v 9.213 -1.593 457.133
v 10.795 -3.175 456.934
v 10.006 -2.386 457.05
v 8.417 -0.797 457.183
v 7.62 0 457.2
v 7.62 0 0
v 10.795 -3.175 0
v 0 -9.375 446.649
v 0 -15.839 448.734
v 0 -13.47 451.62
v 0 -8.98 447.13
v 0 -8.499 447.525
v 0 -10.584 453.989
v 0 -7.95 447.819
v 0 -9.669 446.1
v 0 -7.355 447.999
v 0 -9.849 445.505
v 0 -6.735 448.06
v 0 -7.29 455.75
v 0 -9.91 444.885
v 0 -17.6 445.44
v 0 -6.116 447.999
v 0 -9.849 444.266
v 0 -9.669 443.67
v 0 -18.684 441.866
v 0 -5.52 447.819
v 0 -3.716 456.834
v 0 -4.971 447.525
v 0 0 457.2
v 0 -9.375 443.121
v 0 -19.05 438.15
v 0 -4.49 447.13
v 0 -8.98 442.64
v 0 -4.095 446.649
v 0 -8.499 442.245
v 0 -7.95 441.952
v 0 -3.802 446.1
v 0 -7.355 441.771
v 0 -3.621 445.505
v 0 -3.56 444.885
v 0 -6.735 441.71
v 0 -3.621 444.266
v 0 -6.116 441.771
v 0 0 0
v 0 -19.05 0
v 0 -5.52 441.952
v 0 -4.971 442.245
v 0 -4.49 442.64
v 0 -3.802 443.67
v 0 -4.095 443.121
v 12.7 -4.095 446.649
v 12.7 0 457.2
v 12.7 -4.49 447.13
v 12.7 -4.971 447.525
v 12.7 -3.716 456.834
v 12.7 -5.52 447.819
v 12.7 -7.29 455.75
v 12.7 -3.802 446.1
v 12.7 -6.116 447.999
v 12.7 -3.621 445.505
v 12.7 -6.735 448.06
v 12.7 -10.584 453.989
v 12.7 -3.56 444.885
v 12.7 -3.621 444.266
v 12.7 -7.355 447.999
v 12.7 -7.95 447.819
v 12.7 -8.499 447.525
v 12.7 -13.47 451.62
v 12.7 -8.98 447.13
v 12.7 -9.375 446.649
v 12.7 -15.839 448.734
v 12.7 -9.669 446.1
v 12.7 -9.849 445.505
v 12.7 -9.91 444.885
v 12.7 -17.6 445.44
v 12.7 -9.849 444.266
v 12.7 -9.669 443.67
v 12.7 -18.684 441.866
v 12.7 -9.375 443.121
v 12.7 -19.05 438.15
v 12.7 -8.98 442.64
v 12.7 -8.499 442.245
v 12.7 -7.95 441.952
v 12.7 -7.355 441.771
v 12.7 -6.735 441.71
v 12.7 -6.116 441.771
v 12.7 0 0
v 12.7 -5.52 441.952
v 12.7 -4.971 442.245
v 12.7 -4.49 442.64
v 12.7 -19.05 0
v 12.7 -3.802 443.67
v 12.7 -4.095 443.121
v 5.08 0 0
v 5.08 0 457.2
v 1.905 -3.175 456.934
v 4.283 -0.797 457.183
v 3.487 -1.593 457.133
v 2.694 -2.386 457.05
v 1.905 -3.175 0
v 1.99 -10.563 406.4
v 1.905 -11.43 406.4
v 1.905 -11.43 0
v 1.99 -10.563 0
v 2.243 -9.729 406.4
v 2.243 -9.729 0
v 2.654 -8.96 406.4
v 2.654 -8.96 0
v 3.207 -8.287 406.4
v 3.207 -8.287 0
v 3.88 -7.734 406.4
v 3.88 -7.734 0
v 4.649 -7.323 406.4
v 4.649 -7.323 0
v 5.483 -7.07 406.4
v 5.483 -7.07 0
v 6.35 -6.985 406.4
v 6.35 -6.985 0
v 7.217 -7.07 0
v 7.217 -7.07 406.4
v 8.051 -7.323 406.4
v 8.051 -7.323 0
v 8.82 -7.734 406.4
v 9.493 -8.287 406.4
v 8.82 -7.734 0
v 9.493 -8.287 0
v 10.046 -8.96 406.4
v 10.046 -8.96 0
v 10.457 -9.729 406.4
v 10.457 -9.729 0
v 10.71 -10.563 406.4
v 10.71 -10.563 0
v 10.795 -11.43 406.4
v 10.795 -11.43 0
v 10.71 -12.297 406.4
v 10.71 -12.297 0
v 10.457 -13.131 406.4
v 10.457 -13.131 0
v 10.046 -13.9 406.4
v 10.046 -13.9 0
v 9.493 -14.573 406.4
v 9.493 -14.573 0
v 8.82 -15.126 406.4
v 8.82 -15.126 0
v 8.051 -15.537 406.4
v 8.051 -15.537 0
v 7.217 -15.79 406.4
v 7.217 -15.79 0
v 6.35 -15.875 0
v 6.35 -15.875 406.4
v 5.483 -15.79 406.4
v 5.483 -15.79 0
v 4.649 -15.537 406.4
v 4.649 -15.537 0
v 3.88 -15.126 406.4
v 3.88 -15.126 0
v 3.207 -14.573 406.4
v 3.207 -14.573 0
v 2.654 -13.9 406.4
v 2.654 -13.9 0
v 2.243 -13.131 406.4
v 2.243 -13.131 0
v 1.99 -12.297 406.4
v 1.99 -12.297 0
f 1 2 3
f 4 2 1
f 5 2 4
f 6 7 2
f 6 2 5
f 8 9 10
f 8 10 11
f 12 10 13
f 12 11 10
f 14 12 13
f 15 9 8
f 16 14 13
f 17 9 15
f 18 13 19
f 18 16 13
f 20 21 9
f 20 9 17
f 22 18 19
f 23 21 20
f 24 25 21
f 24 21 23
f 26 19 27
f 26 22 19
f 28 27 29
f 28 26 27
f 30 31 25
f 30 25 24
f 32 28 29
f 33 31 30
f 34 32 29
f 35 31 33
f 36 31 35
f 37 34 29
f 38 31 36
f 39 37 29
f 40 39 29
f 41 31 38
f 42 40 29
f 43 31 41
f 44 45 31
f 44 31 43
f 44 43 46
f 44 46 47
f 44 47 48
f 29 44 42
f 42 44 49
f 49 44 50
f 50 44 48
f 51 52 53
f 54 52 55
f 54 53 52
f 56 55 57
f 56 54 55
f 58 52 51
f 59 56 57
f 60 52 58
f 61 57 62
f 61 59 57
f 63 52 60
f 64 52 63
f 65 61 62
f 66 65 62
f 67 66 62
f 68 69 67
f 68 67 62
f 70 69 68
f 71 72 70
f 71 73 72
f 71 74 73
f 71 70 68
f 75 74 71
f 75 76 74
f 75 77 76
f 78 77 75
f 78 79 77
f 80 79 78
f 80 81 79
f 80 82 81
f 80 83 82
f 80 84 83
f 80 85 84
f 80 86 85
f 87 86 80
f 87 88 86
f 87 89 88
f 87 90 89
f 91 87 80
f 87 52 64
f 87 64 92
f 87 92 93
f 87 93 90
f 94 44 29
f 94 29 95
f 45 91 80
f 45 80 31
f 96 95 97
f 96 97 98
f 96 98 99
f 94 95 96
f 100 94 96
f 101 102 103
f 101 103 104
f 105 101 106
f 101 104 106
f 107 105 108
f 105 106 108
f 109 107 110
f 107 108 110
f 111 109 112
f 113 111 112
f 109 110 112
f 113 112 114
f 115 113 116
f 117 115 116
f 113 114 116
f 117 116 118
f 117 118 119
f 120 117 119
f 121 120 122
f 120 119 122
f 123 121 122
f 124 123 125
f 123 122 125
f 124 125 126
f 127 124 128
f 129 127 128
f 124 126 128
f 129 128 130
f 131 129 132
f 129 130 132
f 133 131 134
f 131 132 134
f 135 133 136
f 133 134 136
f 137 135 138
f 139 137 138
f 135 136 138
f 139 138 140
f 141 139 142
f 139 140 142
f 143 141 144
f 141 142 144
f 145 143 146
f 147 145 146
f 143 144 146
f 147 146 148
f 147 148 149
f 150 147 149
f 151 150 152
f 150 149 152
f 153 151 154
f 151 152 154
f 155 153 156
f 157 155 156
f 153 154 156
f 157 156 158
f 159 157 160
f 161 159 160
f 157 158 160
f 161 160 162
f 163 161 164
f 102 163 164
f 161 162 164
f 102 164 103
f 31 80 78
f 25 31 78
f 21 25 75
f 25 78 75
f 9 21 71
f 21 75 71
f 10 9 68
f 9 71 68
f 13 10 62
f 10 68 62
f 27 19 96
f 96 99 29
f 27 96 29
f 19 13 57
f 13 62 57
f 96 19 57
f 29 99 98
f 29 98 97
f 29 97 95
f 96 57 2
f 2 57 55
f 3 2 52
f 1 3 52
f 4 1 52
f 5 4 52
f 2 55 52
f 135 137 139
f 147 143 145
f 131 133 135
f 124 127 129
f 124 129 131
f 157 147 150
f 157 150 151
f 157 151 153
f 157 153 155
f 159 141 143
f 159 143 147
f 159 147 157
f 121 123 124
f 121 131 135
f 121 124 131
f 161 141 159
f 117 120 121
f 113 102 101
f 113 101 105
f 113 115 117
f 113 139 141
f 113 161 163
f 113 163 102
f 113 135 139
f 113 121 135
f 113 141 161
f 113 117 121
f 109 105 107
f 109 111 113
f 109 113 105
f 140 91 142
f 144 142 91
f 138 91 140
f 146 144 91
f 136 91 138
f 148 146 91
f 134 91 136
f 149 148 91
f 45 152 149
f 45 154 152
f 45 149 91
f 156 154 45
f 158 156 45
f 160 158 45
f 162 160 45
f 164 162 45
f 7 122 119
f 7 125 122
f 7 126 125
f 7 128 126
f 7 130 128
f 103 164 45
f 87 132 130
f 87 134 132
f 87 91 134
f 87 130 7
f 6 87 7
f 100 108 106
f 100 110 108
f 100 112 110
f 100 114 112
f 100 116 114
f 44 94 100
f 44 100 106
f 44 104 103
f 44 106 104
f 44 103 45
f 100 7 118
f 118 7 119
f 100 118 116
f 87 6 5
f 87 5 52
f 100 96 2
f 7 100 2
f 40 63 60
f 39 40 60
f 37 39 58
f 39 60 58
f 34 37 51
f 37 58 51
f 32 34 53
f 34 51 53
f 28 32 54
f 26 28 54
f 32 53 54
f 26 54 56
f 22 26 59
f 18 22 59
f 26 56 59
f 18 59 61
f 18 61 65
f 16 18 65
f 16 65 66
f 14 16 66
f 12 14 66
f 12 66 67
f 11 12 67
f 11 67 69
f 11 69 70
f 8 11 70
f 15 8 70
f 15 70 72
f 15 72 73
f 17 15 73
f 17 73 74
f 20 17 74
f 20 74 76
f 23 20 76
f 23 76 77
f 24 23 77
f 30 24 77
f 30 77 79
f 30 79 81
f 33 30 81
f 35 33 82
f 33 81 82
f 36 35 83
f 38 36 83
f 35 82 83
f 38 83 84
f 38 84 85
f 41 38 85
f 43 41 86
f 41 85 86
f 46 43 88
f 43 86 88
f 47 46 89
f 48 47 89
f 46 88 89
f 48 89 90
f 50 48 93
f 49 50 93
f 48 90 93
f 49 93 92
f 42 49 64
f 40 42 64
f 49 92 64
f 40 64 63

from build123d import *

# Parameters (mm, degrees)
BOSS_EXTRUDE1_DEPTH = 457.2
CUT_EXTRUDE1_DEPTH  = 458.772904943
SKETCH3_R           = 3.175
CUT_EXTRUDE2_DEPTH  = 458.772904943
SKETCH4_R           = 4.445
CUT_EXTRUDE3_DEPTH  = 406.4


with BuildPart() as part:
    # Sketch1 → Boss-Extrude1 (new body)
    with BuildSketch(Plane.XY):
        Polygon((5.08, 0), (1.905, -3.175), (10.795, -3.175), (7.62, 0), (12.7, 0), (12.7, -19.05), (0, -19.05), (0, 0), align=None)
    extrude(amount=BOSS_EXTRUDE1_DEPTH)

    # Sketch2 → Cut-Extrude1 (cut, through all)
    with BuildSketch(Plane(origin=(12.7, 0, 0), x_dir=(0, 0, -1), z_dir=(1, 0, 0))):
        with BuildLine():
            Line((-457.2, 0), (-457.2, -19.05))
            Line((-457.2, -19.05), (-438.15, -19.05))
            ThreePointArc((-438.15, -19.05), (-451.620384182, -13.470384182), (-457.2, 0))
        make_face()
    extrude(amount=-CUT_EXTRUDE1_DEPTH, mode=Mode.SUBTRACT)

    # Sketch3 → Cut-Extrude2 (cut, through all)
    with BuildSketch(Plane(origin=(12.7, 0, 0), x_dir=(0, 0, -1), z_dir=(1, 0, 0))):
        with Locations(Location((-444.885192091, -6.735192091, 0), (0, 0, 90))):
            Circle(SKETCH3_R)
    extrude(amount=-CUT_EXTRUDE2_DEPTH, mode=Mode.SUBTRACT)

    # Sketch4 → Cut-Extrude3 (cut)
    with BuildSketch(Plane(origin=(0, 0, 0), x_dir=(-1, 0, 0), z_dir=(0, 0, -1))):
        with Locations((-6.35, -11.43)):
            Circle(SKETCH4_R)
    extrude(amount=-CUT_EXTRUDE3_DEPTH, mode=Mode.SUBTRACT)


solid = part.part
